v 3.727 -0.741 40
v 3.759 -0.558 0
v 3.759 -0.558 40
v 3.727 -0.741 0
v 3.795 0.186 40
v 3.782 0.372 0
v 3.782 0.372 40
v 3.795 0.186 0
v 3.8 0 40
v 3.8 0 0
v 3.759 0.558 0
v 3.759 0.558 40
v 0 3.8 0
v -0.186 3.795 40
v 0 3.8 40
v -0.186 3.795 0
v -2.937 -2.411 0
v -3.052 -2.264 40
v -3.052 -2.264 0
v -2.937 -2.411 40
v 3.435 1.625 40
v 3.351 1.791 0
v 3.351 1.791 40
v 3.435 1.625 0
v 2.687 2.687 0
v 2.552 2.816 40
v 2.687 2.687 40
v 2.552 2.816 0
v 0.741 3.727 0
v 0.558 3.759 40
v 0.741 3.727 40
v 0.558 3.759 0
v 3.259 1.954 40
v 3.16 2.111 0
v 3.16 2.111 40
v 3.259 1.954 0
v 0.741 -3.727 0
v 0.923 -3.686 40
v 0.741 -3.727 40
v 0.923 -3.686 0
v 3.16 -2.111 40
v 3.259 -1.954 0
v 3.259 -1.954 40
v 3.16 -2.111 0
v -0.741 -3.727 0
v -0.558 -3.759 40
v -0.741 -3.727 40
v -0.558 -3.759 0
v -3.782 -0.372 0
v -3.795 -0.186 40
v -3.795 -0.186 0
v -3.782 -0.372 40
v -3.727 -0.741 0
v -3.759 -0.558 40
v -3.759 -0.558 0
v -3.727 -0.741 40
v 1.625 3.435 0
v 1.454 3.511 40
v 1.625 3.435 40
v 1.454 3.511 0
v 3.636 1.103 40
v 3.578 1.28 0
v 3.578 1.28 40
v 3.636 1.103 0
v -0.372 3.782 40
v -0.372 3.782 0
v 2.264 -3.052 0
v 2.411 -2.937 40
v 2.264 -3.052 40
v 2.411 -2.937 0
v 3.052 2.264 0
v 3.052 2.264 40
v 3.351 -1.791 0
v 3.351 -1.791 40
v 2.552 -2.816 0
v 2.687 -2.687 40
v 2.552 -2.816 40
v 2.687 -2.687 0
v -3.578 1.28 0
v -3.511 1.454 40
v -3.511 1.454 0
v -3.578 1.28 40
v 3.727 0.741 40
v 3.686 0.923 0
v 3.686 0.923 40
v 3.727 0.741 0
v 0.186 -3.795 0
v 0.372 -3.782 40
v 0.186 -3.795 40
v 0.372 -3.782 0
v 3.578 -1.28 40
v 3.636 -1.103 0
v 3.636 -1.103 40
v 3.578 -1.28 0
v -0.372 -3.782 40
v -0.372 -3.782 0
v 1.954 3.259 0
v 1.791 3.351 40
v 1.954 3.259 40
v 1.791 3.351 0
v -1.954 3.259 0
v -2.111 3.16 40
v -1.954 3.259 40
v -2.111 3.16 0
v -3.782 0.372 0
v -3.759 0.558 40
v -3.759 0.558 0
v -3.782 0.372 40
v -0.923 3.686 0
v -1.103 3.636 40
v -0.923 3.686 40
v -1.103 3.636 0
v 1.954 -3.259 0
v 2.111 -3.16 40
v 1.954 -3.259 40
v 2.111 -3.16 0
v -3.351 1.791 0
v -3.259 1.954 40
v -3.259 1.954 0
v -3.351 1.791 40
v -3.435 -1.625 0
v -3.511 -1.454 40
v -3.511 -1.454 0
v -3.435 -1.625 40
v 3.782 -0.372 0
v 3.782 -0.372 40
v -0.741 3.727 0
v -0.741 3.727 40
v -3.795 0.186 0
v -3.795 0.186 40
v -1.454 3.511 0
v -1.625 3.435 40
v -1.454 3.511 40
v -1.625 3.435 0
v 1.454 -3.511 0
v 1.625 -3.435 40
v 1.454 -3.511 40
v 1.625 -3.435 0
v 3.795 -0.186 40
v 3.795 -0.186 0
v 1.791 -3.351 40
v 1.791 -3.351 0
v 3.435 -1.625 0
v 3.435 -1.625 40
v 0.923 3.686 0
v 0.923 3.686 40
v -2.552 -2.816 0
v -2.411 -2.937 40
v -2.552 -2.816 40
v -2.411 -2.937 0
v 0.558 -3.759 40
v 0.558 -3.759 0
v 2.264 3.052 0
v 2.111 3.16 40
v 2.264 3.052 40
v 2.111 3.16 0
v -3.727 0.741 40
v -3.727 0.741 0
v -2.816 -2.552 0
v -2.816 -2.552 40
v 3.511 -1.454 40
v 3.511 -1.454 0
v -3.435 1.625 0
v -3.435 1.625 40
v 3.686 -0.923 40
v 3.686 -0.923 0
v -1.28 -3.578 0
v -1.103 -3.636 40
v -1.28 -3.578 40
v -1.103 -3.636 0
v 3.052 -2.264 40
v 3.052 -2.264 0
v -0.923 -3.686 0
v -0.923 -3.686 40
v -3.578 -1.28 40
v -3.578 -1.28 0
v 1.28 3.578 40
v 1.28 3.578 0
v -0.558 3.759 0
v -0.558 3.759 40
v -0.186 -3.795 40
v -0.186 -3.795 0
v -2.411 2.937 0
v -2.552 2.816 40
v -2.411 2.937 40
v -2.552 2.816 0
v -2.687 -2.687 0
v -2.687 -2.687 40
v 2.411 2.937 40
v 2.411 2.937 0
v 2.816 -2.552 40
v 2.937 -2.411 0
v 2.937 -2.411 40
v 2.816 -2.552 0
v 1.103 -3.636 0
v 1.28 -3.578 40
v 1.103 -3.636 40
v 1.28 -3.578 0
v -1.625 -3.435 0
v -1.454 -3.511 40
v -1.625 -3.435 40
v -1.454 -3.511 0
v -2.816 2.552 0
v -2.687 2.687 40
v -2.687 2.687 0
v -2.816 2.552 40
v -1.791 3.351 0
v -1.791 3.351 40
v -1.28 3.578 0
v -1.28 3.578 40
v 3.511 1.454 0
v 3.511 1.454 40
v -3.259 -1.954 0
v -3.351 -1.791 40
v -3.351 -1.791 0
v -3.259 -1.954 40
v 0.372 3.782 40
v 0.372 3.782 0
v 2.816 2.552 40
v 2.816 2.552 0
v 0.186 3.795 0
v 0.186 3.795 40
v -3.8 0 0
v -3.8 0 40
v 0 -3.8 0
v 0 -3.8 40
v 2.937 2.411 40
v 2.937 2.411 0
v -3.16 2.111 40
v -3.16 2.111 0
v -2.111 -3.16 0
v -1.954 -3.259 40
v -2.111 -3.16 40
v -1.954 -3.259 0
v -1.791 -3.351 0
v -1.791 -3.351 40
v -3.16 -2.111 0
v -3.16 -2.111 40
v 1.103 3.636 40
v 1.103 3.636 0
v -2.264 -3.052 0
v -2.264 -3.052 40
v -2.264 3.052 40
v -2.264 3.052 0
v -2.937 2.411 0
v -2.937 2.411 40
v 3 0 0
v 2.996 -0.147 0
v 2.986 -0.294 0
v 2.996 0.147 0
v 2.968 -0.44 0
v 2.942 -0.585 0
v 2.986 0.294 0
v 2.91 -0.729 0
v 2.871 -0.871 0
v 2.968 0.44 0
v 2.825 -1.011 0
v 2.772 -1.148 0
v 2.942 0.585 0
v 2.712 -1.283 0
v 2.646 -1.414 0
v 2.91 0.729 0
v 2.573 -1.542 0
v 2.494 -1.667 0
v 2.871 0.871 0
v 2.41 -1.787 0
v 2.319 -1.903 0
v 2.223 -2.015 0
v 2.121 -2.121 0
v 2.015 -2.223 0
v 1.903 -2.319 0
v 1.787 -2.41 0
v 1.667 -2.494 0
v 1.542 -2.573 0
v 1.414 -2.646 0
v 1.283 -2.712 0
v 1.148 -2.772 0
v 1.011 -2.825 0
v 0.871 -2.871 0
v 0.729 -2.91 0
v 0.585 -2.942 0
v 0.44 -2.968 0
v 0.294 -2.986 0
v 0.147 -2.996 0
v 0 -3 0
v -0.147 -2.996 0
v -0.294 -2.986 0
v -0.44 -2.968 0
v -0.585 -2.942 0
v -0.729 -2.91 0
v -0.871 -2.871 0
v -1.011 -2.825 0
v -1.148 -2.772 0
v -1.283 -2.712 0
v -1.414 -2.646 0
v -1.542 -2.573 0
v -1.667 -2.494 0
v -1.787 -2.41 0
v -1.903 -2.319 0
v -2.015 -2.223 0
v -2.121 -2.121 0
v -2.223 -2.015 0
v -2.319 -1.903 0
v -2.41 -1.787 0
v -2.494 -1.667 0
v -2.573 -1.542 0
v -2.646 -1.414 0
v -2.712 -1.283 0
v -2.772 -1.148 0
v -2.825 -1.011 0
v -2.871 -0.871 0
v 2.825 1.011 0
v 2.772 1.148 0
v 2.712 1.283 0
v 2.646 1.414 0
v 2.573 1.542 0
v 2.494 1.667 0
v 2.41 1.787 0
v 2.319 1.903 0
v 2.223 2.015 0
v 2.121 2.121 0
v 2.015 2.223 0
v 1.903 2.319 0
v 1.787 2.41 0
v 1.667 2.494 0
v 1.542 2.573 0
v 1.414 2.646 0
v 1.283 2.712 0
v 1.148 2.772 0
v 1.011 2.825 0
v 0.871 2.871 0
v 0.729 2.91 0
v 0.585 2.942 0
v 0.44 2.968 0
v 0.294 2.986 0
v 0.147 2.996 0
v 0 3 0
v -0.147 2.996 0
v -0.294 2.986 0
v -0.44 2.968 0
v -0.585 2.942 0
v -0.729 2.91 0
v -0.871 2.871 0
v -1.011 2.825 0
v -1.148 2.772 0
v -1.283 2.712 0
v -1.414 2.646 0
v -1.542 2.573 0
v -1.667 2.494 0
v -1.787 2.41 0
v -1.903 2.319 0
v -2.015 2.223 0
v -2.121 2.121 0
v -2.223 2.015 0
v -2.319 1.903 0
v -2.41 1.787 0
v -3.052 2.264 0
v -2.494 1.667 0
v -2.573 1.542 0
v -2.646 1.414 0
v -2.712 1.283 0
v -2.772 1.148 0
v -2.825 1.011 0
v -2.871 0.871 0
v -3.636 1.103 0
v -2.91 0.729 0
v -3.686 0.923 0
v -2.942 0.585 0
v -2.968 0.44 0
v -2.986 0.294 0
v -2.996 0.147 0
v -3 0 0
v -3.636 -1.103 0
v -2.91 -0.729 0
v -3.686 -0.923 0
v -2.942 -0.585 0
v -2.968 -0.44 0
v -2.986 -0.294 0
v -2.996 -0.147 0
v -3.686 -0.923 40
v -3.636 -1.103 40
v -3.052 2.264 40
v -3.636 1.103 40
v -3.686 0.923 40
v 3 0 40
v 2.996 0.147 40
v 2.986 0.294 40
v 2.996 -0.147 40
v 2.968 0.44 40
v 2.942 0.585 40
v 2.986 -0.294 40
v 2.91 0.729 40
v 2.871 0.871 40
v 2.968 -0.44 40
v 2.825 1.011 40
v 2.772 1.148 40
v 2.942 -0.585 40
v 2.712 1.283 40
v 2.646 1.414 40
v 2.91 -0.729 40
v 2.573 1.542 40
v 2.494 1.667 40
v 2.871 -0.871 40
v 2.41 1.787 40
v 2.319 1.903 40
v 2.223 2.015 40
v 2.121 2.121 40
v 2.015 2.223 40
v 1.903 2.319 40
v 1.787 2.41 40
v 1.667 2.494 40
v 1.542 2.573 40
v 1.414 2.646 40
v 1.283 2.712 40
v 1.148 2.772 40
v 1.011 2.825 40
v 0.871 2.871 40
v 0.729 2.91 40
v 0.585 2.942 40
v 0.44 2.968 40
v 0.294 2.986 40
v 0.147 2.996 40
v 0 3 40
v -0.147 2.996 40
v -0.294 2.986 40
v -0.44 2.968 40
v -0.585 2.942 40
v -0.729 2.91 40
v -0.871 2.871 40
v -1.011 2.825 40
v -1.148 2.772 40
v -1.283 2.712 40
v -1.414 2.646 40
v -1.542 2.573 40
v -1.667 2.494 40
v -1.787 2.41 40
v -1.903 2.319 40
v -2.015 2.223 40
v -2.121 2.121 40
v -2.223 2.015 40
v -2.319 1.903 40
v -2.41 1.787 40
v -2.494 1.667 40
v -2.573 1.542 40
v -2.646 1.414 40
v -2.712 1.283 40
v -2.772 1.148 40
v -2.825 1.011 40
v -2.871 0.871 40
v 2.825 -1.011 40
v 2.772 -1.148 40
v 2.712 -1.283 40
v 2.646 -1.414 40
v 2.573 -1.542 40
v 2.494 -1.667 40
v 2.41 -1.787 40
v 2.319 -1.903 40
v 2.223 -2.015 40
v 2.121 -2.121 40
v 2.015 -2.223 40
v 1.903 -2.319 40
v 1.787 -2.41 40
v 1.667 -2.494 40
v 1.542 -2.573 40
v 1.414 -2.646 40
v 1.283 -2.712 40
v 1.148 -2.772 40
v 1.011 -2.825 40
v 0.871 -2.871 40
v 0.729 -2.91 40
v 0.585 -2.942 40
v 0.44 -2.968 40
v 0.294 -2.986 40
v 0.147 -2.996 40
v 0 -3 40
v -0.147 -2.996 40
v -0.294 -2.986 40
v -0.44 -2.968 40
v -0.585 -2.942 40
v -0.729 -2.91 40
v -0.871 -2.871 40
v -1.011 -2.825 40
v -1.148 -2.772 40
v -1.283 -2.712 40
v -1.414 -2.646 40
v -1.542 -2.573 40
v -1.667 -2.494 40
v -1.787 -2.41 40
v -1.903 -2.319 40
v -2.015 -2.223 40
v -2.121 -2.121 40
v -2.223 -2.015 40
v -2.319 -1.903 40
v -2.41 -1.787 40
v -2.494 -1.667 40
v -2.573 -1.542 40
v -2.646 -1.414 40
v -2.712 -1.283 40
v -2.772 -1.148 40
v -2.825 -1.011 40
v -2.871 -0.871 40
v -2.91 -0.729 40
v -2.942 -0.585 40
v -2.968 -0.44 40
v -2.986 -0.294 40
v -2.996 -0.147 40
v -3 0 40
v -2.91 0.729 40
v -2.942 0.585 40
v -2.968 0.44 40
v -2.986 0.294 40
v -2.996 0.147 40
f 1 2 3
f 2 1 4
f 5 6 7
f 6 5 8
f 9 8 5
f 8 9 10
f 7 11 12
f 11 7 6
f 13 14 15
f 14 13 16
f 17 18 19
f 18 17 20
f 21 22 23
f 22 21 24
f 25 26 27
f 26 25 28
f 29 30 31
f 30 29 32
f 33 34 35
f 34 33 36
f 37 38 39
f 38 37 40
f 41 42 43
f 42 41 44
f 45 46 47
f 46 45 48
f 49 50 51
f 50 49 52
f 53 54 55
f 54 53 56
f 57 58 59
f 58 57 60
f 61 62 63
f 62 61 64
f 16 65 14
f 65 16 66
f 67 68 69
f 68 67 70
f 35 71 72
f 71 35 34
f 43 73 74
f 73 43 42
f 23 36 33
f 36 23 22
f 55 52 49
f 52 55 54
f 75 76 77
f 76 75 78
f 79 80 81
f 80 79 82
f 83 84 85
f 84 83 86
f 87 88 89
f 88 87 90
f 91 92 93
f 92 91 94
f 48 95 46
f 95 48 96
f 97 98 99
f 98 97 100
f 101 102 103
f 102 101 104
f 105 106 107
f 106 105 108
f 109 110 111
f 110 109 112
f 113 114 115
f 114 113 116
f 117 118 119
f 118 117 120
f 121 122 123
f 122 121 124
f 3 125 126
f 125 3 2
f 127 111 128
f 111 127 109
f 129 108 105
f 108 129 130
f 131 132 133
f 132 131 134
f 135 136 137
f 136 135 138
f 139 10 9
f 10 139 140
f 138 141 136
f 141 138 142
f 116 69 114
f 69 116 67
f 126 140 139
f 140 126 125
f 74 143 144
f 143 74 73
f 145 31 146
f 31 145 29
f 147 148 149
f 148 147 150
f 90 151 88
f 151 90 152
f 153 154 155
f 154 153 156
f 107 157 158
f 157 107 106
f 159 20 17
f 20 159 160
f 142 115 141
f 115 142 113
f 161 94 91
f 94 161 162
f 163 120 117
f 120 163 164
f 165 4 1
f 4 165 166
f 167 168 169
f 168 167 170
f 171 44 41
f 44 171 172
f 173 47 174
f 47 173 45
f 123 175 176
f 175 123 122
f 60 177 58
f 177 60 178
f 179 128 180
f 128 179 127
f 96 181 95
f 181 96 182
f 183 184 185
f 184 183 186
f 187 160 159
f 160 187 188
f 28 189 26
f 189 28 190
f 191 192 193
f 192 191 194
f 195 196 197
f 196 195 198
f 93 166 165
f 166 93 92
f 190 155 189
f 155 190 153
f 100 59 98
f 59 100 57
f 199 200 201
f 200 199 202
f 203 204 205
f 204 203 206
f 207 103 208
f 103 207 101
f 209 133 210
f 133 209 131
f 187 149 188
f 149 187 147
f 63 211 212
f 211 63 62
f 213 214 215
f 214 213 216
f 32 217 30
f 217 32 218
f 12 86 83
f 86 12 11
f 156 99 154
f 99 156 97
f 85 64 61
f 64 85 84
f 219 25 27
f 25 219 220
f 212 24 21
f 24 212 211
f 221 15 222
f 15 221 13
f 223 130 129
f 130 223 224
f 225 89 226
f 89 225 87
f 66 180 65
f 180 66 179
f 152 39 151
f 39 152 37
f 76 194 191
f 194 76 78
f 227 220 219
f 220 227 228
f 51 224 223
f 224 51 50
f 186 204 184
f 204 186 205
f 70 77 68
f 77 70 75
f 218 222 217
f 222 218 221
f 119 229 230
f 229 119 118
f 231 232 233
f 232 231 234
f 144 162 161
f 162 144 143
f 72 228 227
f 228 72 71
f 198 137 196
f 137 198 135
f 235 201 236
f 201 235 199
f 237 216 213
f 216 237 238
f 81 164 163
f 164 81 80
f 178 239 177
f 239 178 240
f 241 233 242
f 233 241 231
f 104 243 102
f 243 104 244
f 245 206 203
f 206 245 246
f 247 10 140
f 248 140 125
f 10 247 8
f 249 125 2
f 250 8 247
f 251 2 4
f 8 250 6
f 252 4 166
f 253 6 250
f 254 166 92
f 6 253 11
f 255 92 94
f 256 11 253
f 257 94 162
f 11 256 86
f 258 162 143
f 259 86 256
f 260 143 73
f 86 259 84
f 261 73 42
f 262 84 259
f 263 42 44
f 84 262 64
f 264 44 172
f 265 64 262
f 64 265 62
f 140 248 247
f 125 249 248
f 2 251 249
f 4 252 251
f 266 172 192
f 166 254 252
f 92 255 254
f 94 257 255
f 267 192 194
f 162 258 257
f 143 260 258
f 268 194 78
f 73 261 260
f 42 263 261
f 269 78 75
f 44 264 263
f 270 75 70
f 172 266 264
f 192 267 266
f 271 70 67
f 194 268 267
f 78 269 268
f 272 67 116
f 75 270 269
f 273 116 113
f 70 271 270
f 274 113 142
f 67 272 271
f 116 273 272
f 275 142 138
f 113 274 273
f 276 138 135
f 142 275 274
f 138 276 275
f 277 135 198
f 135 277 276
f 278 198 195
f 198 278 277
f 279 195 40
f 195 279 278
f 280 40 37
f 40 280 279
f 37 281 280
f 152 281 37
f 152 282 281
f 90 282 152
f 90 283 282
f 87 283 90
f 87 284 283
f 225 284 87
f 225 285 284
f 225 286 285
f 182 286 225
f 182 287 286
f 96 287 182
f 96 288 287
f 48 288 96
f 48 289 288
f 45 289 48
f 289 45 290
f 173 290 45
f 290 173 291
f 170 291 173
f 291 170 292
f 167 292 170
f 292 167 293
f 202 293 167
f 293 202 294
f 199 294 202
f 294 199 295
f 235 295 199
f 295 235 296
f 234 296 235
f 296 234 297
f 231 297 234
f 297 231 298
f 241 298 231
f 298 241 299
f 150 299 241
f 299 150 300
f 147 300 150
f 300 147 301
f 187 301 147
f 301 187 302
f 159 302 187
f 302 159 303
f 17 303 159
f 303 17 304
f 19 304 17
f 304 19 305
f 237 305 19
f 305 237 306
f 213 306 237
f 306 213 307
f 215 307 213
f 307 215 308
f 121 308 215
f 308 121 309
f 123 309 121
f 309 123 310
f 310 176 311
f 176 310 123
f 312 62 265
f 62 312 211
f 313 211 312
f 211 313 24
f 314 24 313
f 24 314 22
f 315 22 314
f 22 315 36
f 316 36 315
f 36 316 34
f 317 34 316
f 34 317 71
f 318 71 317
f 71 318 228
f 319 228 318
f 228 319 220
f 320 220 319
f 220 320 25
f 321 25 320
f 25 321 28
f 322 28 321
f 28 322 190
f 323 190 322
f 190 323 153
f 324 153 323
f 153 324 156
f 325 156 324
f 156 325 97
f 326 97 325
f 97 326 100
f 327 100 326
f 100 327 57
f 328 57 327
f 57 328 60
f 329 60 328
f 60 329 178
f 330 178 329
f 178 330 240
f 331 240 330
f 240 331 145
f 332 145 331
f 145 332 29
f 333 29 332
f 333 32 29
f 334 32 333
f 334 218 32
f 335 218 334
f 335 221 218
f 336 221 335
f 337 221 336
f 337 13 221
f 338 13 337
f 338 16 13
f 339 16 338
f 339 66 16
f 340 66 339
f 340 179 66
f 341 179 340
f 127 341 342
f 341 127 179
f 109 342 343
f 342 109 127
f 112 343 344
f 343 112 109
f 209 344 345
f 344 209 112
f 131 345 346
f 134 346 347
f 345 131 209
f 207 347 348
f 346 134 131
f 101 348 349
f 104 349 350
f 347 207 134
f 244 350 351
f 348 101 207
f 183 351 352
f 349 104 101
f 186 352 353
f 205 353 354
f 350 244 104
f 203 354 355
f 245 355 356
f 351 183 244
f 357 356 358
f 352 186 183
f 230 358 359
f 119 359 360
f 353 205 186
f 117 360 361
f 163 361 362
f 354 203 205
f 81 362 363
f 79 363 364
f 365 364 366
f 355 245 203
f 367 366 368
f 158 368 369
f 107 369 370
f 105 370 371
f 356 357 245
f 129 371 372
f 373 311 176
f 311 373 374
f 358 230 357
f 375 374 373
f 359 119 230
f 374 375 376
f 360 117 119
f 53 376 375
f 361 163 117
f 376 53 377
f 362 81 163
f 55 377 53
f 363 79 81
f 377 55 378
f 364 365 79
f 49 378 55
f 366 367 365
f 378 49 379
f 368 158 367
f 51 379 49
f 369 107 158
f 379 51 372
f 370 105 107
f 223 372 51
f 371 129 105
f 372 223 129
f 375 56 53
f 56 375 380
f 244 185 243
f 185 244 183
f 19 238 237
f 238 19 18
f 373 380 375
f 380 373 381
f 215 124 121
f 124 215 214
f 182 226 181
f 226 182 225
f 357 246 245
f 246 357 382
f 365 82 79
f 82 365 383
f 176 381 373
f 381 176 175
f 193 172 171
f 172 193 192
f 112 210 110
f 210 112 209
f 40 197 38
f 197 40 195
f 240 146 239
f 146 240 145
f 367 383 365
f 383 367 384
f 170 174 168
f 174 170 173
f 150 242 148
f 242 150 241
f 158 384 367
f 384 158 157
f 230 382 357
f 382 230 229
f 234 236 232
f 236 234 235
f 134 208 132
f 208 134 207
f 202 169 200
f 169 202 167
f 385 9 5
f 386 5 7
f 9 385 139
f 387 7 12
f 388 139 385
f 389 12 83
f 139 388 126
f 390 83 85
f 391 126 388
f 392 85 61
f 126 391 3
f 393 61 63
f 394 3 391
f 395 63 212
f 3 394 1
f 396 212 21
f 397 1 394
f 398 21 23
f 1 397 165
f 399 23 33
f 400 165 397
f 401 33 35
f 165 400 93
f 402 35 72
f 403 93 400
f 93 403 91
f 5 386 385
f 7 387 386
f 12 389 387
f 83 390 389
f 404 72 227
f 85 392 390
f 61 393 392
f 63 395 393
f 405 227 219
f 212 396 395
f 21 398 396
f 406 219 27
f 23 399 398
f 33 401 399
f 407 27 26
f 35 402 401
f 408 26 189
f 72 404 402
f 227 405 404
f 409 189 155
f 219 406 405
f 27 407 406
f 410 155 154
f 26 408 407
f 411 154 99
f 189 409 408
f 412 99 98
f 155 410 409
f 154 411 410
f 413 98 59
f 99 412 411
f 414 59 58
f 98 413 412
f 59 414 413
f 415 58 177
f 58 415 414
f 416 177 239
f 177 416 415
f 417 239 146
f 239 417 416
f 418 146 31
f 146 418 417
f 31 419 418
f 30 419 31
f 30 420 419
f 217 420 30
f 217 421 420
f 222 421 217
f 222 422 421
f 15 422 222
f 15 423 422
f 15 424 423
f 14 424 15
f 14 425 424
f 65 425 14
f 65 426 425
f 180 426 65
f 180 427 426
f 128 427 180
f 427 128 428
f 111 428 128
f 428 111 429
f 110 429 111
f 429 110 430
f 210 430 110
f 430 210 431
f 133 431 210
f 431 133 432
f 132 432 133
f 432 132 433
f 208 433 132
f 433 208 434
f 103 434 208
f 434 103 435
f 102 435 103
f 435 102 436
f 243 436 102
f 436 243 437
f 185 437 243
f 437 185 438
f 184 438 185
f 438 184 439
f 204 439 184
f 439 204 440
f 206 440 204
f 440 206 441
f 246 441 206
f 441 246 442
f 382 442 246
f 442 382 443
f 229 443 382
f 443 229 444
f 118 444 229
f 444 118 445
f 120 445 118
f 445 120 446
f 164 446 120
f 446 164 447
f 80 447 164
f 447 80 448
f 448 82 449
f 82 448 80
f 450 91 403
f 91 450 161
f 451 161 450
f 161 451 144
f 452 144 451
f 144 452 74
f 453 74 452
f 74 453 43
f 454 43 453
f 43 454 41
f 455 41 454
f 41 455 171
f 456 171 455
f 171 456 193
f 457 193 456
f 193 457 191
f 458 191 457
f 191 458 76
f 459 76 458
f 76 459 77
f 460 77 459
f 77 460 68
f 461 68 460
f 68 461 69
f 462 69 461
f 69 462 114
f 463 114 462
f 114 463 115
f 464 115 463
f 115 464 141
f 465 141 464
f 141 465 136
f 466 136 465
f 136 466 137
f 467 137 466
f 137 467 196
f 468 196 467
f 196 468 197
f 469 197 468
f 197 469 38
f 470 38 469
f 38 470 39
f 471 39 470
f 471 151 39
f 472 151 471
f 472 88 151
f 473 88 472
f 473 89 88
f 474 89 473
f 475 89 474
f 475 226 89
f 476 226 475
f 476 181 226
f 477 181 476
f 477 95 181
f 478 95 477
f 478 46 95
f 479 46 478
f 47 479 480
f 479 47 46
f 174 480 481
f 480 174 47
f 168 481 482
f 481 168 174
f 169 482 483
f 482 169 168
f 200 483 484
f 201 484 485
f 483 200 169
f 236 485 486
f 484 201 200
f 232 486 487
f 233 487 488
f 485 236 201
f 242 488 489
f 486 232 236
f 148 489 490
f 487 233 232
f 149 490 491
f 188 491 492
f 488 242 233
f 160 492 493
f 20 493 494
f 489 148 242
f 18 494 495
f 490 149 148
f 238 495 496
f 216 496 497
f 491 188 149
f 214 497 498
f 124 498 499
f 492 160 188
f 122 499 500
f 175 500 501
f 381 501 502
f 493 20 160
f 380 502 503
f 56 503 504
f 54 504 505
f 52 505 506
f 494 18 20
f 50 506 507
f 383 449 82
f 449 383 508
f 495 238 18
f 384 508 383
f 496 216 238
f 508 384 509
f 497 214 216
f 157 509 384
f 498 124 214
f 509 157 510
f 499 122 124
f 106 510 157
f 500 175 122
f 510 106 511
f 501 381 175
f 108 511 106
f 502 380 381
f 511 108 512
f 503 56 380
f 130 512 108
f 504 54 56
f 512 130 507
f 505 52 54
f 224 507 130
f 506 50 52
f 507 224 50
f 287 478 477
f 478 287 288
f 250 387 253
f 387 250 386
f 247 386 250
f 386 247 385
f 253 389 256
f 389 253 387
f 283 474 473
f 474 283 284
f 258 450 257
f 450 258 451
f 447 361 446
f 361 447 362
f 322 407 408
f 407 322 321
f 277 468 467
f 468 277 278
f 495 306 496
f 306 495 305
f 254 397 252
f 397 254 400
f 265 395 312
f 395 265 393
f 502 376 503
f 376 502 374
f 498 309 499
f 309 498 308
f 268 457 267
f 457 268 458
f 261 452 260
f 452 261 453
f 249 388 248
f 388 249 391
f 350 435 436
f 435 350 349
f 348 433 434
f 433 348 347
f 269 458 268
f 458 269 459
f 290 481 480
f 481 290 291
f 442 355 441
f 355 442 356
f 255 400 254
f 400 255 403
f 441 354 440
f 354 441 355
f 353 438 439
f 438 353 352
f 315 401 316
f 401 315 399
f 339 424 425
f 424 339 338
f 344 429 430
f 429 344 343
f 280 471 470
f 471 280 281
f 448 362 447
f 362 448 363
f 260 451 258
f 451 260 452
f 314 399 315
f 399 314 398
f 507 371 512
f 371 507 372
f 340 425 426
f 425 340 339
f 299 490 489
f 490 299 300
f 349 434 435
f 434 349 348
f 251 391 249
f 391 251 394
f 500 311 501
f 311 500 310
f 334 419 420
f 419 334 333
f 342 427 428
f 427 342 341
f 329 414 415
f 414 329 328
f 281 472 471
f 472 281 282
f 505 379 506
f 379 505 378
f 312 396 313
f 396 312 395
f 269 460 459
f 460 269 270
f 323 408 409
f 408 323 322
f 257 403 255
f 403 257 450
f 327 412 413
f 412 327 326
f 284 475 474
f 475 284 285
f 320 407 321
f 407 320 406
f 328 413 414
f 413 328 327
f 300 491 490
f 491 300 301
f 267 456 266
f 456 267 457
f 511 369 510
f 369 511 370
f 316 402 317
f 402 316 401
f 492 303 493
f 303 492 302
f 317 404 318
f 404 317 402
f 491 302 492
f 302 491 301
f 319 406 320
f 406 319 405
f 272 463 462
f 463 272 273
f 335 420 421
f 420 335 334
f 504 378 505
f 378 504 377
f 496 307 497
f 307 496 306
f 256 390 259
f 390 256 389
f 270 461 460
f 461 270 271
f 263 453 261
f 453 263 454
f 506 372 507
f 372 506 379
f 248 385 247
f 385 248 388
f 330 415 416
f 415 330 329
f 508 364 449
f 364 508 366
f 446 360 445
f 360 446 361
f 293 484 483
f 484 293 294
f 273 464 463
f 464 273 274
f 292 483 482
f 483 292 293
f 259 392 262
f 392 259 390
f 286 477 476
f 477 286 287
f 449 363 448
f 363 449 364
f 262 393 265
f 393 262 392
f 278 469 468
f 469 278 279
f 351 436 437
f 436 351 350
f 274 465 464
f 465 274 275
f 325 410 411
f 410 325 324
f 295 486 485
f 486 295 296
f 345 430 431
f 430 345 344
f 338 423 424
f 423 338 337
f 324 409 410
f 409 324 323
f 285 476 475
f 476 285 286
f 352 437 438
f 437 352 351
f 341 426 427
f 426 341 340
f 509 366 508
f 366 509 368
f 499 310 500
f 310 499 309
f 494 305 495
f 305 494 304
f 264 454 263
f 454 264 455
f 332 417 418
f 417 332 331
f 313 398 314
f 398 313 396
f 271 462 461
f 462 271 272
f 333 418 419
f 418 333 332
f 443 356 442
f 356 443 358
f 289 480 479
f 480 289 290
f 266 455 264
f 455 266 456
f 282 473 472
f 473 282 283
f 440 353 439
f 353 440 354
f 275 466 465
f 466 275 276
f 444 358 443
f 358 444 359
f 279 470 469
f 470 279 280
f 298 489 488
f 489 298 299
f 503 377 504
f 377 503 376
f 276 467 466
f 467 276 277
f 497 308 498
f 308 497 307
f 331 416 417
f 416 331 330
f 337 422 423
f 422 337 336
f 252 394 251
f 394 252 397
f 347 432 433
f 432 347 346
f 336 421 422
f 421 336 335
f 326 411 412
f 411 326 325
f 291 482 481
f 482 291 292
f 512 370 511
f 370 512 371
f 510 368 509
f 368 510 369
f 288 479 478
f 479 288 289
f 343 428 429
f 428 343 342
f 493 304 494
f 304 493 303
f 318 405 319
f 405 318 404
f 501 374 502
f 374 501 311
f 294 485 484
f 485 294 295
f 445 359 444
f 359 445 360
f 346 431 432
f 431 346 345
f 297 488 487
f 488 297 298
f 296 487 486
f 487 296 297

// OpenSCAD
$fn = 128;

// Heatshrink sleeving (tubing)
inner_d = 6;          // mm
wall_thickness = 0.8; // mm
length = 40;          // mm

outer_d = inner_d + 2 * wall_thickness;

difference() {
  cylinder(h = length, d = outer_d, center = false);
  translate([0, 0, -0.5])
    cylinder(h = length + 1, d = inner_d, center = false);
}
